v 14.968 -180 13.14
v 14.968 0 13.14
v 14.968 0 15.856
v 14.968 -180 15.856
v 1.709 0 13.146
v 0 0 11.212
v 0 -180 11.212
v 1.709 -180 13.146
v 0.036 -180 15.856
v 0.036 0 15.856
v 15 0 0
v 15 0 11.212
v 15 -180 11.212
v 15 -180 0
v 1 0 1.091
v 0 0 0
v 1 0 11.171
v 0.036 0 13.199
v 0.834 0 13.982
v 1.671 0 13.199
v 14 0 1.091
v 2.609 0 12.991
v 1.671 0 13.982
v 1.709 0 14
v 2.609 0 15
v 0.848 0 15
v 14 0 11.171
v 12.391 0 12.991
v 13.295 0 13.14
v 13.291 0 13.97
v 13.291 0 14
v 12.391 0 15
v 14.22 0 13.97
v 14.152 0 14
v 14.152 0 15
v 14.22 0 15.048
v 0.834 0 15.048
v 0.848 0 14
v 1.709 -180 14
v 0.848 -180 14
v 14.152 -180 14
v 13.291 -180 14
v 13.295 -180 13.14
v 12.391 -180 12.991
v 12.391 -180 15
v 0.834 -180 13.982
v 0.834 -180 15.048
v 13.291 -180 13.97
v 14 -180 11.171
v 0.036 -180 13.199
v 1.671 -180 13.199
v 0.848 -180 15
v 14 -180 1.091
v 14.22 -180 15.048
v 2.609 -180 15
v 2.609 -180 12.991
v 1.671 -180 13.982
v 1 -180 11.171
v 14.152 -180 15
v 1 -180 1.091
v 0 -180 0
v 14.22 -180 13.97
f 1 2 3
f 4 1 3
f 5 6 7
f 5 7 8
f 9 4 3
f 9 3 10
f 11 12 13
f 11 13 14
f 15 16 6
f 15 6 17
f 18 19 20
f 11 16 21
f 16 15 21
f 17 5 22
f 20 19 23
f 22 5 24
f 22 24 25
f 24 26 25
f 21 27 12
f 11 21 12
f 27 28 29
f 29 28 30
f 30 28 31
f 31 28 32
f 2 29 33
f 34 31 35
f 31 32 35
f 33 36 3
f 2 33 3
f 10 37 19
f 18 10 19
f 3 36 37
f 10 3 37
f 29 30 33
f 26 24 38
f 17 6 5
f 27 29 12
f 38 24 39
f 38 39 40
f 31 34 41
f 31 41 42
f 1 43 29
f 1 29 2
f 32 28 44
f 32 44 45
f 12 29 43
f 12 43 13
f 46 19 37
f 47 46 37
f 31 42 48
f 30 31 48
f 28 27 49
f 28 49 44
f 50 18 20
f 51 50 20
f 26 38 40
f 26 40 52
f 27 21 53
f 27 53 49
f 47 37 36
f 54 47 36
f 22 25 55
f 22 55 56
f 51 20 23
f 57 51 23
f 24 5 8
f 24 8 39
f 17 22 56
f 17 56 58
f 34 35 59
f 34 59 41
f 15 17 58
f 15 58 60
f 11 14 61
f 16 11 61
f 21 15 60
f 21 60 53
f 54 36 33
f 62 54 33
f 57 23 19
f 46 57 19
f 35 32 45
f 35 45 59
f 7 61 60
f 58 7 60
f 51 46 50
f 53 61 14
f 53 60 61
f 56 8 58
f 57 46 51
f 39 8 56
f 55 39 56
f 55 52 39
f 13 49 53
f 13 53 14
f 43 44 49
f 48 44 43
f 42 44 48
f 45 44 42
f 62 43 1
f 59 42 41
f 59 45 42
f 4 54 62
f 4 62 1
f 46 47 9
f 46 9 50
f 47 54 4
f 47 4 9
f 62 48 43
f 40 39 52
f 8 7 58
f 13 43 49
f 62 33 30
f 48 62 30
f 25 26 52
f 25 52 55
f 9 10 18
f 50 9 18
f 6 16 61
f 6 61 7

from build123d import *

# Parameters (mm, degrees)
PAD_DEPTH    = 180
PAD001_DEPTH = 180


with BuildPart() as part:
    # Sketch → Pad (new body)
    with BuildSketch(Plane.XZ):
        Polygon((1.709151, 14), (0.847738, 14), (0.847738, 15), (2.609062, 15), (2.609062, 12.991093), (1, 11.170912), (1, 1.090989), (14, 1.090989), (14, 11.170912), (12.390938, 12.991093), (12.390938, 15), (14.152262, 15), (14.152262, 14), (13.290849, 14), (13.290849, 13.145577), (15, 11.212176), (15, 0), (0, 0), (0, 11.212176), (1.709151, 13.145577), align=None)
    extrude(amount=PAD_DEPTH)

    # Sketch001 → Pad001 (join)
    with BuildSketch(Plane.XZ):
        Polygon((1.670899, 13.98237), (0.833981, 13.98237), (0.833981, 15.0478), (14.219909, 15.0478), (14.219909, 13.970164), (13.277989, 13.970164), (13.277989, 13.140446), (14.96773, 13.140446), (14.96773, 15.855778), (0.035527, 15.855778), (0.035527, 13.198529), (1.670899, 13.198529), align=None)
    extrude(amount=PAD001_DEPTH)


solid = part.part
